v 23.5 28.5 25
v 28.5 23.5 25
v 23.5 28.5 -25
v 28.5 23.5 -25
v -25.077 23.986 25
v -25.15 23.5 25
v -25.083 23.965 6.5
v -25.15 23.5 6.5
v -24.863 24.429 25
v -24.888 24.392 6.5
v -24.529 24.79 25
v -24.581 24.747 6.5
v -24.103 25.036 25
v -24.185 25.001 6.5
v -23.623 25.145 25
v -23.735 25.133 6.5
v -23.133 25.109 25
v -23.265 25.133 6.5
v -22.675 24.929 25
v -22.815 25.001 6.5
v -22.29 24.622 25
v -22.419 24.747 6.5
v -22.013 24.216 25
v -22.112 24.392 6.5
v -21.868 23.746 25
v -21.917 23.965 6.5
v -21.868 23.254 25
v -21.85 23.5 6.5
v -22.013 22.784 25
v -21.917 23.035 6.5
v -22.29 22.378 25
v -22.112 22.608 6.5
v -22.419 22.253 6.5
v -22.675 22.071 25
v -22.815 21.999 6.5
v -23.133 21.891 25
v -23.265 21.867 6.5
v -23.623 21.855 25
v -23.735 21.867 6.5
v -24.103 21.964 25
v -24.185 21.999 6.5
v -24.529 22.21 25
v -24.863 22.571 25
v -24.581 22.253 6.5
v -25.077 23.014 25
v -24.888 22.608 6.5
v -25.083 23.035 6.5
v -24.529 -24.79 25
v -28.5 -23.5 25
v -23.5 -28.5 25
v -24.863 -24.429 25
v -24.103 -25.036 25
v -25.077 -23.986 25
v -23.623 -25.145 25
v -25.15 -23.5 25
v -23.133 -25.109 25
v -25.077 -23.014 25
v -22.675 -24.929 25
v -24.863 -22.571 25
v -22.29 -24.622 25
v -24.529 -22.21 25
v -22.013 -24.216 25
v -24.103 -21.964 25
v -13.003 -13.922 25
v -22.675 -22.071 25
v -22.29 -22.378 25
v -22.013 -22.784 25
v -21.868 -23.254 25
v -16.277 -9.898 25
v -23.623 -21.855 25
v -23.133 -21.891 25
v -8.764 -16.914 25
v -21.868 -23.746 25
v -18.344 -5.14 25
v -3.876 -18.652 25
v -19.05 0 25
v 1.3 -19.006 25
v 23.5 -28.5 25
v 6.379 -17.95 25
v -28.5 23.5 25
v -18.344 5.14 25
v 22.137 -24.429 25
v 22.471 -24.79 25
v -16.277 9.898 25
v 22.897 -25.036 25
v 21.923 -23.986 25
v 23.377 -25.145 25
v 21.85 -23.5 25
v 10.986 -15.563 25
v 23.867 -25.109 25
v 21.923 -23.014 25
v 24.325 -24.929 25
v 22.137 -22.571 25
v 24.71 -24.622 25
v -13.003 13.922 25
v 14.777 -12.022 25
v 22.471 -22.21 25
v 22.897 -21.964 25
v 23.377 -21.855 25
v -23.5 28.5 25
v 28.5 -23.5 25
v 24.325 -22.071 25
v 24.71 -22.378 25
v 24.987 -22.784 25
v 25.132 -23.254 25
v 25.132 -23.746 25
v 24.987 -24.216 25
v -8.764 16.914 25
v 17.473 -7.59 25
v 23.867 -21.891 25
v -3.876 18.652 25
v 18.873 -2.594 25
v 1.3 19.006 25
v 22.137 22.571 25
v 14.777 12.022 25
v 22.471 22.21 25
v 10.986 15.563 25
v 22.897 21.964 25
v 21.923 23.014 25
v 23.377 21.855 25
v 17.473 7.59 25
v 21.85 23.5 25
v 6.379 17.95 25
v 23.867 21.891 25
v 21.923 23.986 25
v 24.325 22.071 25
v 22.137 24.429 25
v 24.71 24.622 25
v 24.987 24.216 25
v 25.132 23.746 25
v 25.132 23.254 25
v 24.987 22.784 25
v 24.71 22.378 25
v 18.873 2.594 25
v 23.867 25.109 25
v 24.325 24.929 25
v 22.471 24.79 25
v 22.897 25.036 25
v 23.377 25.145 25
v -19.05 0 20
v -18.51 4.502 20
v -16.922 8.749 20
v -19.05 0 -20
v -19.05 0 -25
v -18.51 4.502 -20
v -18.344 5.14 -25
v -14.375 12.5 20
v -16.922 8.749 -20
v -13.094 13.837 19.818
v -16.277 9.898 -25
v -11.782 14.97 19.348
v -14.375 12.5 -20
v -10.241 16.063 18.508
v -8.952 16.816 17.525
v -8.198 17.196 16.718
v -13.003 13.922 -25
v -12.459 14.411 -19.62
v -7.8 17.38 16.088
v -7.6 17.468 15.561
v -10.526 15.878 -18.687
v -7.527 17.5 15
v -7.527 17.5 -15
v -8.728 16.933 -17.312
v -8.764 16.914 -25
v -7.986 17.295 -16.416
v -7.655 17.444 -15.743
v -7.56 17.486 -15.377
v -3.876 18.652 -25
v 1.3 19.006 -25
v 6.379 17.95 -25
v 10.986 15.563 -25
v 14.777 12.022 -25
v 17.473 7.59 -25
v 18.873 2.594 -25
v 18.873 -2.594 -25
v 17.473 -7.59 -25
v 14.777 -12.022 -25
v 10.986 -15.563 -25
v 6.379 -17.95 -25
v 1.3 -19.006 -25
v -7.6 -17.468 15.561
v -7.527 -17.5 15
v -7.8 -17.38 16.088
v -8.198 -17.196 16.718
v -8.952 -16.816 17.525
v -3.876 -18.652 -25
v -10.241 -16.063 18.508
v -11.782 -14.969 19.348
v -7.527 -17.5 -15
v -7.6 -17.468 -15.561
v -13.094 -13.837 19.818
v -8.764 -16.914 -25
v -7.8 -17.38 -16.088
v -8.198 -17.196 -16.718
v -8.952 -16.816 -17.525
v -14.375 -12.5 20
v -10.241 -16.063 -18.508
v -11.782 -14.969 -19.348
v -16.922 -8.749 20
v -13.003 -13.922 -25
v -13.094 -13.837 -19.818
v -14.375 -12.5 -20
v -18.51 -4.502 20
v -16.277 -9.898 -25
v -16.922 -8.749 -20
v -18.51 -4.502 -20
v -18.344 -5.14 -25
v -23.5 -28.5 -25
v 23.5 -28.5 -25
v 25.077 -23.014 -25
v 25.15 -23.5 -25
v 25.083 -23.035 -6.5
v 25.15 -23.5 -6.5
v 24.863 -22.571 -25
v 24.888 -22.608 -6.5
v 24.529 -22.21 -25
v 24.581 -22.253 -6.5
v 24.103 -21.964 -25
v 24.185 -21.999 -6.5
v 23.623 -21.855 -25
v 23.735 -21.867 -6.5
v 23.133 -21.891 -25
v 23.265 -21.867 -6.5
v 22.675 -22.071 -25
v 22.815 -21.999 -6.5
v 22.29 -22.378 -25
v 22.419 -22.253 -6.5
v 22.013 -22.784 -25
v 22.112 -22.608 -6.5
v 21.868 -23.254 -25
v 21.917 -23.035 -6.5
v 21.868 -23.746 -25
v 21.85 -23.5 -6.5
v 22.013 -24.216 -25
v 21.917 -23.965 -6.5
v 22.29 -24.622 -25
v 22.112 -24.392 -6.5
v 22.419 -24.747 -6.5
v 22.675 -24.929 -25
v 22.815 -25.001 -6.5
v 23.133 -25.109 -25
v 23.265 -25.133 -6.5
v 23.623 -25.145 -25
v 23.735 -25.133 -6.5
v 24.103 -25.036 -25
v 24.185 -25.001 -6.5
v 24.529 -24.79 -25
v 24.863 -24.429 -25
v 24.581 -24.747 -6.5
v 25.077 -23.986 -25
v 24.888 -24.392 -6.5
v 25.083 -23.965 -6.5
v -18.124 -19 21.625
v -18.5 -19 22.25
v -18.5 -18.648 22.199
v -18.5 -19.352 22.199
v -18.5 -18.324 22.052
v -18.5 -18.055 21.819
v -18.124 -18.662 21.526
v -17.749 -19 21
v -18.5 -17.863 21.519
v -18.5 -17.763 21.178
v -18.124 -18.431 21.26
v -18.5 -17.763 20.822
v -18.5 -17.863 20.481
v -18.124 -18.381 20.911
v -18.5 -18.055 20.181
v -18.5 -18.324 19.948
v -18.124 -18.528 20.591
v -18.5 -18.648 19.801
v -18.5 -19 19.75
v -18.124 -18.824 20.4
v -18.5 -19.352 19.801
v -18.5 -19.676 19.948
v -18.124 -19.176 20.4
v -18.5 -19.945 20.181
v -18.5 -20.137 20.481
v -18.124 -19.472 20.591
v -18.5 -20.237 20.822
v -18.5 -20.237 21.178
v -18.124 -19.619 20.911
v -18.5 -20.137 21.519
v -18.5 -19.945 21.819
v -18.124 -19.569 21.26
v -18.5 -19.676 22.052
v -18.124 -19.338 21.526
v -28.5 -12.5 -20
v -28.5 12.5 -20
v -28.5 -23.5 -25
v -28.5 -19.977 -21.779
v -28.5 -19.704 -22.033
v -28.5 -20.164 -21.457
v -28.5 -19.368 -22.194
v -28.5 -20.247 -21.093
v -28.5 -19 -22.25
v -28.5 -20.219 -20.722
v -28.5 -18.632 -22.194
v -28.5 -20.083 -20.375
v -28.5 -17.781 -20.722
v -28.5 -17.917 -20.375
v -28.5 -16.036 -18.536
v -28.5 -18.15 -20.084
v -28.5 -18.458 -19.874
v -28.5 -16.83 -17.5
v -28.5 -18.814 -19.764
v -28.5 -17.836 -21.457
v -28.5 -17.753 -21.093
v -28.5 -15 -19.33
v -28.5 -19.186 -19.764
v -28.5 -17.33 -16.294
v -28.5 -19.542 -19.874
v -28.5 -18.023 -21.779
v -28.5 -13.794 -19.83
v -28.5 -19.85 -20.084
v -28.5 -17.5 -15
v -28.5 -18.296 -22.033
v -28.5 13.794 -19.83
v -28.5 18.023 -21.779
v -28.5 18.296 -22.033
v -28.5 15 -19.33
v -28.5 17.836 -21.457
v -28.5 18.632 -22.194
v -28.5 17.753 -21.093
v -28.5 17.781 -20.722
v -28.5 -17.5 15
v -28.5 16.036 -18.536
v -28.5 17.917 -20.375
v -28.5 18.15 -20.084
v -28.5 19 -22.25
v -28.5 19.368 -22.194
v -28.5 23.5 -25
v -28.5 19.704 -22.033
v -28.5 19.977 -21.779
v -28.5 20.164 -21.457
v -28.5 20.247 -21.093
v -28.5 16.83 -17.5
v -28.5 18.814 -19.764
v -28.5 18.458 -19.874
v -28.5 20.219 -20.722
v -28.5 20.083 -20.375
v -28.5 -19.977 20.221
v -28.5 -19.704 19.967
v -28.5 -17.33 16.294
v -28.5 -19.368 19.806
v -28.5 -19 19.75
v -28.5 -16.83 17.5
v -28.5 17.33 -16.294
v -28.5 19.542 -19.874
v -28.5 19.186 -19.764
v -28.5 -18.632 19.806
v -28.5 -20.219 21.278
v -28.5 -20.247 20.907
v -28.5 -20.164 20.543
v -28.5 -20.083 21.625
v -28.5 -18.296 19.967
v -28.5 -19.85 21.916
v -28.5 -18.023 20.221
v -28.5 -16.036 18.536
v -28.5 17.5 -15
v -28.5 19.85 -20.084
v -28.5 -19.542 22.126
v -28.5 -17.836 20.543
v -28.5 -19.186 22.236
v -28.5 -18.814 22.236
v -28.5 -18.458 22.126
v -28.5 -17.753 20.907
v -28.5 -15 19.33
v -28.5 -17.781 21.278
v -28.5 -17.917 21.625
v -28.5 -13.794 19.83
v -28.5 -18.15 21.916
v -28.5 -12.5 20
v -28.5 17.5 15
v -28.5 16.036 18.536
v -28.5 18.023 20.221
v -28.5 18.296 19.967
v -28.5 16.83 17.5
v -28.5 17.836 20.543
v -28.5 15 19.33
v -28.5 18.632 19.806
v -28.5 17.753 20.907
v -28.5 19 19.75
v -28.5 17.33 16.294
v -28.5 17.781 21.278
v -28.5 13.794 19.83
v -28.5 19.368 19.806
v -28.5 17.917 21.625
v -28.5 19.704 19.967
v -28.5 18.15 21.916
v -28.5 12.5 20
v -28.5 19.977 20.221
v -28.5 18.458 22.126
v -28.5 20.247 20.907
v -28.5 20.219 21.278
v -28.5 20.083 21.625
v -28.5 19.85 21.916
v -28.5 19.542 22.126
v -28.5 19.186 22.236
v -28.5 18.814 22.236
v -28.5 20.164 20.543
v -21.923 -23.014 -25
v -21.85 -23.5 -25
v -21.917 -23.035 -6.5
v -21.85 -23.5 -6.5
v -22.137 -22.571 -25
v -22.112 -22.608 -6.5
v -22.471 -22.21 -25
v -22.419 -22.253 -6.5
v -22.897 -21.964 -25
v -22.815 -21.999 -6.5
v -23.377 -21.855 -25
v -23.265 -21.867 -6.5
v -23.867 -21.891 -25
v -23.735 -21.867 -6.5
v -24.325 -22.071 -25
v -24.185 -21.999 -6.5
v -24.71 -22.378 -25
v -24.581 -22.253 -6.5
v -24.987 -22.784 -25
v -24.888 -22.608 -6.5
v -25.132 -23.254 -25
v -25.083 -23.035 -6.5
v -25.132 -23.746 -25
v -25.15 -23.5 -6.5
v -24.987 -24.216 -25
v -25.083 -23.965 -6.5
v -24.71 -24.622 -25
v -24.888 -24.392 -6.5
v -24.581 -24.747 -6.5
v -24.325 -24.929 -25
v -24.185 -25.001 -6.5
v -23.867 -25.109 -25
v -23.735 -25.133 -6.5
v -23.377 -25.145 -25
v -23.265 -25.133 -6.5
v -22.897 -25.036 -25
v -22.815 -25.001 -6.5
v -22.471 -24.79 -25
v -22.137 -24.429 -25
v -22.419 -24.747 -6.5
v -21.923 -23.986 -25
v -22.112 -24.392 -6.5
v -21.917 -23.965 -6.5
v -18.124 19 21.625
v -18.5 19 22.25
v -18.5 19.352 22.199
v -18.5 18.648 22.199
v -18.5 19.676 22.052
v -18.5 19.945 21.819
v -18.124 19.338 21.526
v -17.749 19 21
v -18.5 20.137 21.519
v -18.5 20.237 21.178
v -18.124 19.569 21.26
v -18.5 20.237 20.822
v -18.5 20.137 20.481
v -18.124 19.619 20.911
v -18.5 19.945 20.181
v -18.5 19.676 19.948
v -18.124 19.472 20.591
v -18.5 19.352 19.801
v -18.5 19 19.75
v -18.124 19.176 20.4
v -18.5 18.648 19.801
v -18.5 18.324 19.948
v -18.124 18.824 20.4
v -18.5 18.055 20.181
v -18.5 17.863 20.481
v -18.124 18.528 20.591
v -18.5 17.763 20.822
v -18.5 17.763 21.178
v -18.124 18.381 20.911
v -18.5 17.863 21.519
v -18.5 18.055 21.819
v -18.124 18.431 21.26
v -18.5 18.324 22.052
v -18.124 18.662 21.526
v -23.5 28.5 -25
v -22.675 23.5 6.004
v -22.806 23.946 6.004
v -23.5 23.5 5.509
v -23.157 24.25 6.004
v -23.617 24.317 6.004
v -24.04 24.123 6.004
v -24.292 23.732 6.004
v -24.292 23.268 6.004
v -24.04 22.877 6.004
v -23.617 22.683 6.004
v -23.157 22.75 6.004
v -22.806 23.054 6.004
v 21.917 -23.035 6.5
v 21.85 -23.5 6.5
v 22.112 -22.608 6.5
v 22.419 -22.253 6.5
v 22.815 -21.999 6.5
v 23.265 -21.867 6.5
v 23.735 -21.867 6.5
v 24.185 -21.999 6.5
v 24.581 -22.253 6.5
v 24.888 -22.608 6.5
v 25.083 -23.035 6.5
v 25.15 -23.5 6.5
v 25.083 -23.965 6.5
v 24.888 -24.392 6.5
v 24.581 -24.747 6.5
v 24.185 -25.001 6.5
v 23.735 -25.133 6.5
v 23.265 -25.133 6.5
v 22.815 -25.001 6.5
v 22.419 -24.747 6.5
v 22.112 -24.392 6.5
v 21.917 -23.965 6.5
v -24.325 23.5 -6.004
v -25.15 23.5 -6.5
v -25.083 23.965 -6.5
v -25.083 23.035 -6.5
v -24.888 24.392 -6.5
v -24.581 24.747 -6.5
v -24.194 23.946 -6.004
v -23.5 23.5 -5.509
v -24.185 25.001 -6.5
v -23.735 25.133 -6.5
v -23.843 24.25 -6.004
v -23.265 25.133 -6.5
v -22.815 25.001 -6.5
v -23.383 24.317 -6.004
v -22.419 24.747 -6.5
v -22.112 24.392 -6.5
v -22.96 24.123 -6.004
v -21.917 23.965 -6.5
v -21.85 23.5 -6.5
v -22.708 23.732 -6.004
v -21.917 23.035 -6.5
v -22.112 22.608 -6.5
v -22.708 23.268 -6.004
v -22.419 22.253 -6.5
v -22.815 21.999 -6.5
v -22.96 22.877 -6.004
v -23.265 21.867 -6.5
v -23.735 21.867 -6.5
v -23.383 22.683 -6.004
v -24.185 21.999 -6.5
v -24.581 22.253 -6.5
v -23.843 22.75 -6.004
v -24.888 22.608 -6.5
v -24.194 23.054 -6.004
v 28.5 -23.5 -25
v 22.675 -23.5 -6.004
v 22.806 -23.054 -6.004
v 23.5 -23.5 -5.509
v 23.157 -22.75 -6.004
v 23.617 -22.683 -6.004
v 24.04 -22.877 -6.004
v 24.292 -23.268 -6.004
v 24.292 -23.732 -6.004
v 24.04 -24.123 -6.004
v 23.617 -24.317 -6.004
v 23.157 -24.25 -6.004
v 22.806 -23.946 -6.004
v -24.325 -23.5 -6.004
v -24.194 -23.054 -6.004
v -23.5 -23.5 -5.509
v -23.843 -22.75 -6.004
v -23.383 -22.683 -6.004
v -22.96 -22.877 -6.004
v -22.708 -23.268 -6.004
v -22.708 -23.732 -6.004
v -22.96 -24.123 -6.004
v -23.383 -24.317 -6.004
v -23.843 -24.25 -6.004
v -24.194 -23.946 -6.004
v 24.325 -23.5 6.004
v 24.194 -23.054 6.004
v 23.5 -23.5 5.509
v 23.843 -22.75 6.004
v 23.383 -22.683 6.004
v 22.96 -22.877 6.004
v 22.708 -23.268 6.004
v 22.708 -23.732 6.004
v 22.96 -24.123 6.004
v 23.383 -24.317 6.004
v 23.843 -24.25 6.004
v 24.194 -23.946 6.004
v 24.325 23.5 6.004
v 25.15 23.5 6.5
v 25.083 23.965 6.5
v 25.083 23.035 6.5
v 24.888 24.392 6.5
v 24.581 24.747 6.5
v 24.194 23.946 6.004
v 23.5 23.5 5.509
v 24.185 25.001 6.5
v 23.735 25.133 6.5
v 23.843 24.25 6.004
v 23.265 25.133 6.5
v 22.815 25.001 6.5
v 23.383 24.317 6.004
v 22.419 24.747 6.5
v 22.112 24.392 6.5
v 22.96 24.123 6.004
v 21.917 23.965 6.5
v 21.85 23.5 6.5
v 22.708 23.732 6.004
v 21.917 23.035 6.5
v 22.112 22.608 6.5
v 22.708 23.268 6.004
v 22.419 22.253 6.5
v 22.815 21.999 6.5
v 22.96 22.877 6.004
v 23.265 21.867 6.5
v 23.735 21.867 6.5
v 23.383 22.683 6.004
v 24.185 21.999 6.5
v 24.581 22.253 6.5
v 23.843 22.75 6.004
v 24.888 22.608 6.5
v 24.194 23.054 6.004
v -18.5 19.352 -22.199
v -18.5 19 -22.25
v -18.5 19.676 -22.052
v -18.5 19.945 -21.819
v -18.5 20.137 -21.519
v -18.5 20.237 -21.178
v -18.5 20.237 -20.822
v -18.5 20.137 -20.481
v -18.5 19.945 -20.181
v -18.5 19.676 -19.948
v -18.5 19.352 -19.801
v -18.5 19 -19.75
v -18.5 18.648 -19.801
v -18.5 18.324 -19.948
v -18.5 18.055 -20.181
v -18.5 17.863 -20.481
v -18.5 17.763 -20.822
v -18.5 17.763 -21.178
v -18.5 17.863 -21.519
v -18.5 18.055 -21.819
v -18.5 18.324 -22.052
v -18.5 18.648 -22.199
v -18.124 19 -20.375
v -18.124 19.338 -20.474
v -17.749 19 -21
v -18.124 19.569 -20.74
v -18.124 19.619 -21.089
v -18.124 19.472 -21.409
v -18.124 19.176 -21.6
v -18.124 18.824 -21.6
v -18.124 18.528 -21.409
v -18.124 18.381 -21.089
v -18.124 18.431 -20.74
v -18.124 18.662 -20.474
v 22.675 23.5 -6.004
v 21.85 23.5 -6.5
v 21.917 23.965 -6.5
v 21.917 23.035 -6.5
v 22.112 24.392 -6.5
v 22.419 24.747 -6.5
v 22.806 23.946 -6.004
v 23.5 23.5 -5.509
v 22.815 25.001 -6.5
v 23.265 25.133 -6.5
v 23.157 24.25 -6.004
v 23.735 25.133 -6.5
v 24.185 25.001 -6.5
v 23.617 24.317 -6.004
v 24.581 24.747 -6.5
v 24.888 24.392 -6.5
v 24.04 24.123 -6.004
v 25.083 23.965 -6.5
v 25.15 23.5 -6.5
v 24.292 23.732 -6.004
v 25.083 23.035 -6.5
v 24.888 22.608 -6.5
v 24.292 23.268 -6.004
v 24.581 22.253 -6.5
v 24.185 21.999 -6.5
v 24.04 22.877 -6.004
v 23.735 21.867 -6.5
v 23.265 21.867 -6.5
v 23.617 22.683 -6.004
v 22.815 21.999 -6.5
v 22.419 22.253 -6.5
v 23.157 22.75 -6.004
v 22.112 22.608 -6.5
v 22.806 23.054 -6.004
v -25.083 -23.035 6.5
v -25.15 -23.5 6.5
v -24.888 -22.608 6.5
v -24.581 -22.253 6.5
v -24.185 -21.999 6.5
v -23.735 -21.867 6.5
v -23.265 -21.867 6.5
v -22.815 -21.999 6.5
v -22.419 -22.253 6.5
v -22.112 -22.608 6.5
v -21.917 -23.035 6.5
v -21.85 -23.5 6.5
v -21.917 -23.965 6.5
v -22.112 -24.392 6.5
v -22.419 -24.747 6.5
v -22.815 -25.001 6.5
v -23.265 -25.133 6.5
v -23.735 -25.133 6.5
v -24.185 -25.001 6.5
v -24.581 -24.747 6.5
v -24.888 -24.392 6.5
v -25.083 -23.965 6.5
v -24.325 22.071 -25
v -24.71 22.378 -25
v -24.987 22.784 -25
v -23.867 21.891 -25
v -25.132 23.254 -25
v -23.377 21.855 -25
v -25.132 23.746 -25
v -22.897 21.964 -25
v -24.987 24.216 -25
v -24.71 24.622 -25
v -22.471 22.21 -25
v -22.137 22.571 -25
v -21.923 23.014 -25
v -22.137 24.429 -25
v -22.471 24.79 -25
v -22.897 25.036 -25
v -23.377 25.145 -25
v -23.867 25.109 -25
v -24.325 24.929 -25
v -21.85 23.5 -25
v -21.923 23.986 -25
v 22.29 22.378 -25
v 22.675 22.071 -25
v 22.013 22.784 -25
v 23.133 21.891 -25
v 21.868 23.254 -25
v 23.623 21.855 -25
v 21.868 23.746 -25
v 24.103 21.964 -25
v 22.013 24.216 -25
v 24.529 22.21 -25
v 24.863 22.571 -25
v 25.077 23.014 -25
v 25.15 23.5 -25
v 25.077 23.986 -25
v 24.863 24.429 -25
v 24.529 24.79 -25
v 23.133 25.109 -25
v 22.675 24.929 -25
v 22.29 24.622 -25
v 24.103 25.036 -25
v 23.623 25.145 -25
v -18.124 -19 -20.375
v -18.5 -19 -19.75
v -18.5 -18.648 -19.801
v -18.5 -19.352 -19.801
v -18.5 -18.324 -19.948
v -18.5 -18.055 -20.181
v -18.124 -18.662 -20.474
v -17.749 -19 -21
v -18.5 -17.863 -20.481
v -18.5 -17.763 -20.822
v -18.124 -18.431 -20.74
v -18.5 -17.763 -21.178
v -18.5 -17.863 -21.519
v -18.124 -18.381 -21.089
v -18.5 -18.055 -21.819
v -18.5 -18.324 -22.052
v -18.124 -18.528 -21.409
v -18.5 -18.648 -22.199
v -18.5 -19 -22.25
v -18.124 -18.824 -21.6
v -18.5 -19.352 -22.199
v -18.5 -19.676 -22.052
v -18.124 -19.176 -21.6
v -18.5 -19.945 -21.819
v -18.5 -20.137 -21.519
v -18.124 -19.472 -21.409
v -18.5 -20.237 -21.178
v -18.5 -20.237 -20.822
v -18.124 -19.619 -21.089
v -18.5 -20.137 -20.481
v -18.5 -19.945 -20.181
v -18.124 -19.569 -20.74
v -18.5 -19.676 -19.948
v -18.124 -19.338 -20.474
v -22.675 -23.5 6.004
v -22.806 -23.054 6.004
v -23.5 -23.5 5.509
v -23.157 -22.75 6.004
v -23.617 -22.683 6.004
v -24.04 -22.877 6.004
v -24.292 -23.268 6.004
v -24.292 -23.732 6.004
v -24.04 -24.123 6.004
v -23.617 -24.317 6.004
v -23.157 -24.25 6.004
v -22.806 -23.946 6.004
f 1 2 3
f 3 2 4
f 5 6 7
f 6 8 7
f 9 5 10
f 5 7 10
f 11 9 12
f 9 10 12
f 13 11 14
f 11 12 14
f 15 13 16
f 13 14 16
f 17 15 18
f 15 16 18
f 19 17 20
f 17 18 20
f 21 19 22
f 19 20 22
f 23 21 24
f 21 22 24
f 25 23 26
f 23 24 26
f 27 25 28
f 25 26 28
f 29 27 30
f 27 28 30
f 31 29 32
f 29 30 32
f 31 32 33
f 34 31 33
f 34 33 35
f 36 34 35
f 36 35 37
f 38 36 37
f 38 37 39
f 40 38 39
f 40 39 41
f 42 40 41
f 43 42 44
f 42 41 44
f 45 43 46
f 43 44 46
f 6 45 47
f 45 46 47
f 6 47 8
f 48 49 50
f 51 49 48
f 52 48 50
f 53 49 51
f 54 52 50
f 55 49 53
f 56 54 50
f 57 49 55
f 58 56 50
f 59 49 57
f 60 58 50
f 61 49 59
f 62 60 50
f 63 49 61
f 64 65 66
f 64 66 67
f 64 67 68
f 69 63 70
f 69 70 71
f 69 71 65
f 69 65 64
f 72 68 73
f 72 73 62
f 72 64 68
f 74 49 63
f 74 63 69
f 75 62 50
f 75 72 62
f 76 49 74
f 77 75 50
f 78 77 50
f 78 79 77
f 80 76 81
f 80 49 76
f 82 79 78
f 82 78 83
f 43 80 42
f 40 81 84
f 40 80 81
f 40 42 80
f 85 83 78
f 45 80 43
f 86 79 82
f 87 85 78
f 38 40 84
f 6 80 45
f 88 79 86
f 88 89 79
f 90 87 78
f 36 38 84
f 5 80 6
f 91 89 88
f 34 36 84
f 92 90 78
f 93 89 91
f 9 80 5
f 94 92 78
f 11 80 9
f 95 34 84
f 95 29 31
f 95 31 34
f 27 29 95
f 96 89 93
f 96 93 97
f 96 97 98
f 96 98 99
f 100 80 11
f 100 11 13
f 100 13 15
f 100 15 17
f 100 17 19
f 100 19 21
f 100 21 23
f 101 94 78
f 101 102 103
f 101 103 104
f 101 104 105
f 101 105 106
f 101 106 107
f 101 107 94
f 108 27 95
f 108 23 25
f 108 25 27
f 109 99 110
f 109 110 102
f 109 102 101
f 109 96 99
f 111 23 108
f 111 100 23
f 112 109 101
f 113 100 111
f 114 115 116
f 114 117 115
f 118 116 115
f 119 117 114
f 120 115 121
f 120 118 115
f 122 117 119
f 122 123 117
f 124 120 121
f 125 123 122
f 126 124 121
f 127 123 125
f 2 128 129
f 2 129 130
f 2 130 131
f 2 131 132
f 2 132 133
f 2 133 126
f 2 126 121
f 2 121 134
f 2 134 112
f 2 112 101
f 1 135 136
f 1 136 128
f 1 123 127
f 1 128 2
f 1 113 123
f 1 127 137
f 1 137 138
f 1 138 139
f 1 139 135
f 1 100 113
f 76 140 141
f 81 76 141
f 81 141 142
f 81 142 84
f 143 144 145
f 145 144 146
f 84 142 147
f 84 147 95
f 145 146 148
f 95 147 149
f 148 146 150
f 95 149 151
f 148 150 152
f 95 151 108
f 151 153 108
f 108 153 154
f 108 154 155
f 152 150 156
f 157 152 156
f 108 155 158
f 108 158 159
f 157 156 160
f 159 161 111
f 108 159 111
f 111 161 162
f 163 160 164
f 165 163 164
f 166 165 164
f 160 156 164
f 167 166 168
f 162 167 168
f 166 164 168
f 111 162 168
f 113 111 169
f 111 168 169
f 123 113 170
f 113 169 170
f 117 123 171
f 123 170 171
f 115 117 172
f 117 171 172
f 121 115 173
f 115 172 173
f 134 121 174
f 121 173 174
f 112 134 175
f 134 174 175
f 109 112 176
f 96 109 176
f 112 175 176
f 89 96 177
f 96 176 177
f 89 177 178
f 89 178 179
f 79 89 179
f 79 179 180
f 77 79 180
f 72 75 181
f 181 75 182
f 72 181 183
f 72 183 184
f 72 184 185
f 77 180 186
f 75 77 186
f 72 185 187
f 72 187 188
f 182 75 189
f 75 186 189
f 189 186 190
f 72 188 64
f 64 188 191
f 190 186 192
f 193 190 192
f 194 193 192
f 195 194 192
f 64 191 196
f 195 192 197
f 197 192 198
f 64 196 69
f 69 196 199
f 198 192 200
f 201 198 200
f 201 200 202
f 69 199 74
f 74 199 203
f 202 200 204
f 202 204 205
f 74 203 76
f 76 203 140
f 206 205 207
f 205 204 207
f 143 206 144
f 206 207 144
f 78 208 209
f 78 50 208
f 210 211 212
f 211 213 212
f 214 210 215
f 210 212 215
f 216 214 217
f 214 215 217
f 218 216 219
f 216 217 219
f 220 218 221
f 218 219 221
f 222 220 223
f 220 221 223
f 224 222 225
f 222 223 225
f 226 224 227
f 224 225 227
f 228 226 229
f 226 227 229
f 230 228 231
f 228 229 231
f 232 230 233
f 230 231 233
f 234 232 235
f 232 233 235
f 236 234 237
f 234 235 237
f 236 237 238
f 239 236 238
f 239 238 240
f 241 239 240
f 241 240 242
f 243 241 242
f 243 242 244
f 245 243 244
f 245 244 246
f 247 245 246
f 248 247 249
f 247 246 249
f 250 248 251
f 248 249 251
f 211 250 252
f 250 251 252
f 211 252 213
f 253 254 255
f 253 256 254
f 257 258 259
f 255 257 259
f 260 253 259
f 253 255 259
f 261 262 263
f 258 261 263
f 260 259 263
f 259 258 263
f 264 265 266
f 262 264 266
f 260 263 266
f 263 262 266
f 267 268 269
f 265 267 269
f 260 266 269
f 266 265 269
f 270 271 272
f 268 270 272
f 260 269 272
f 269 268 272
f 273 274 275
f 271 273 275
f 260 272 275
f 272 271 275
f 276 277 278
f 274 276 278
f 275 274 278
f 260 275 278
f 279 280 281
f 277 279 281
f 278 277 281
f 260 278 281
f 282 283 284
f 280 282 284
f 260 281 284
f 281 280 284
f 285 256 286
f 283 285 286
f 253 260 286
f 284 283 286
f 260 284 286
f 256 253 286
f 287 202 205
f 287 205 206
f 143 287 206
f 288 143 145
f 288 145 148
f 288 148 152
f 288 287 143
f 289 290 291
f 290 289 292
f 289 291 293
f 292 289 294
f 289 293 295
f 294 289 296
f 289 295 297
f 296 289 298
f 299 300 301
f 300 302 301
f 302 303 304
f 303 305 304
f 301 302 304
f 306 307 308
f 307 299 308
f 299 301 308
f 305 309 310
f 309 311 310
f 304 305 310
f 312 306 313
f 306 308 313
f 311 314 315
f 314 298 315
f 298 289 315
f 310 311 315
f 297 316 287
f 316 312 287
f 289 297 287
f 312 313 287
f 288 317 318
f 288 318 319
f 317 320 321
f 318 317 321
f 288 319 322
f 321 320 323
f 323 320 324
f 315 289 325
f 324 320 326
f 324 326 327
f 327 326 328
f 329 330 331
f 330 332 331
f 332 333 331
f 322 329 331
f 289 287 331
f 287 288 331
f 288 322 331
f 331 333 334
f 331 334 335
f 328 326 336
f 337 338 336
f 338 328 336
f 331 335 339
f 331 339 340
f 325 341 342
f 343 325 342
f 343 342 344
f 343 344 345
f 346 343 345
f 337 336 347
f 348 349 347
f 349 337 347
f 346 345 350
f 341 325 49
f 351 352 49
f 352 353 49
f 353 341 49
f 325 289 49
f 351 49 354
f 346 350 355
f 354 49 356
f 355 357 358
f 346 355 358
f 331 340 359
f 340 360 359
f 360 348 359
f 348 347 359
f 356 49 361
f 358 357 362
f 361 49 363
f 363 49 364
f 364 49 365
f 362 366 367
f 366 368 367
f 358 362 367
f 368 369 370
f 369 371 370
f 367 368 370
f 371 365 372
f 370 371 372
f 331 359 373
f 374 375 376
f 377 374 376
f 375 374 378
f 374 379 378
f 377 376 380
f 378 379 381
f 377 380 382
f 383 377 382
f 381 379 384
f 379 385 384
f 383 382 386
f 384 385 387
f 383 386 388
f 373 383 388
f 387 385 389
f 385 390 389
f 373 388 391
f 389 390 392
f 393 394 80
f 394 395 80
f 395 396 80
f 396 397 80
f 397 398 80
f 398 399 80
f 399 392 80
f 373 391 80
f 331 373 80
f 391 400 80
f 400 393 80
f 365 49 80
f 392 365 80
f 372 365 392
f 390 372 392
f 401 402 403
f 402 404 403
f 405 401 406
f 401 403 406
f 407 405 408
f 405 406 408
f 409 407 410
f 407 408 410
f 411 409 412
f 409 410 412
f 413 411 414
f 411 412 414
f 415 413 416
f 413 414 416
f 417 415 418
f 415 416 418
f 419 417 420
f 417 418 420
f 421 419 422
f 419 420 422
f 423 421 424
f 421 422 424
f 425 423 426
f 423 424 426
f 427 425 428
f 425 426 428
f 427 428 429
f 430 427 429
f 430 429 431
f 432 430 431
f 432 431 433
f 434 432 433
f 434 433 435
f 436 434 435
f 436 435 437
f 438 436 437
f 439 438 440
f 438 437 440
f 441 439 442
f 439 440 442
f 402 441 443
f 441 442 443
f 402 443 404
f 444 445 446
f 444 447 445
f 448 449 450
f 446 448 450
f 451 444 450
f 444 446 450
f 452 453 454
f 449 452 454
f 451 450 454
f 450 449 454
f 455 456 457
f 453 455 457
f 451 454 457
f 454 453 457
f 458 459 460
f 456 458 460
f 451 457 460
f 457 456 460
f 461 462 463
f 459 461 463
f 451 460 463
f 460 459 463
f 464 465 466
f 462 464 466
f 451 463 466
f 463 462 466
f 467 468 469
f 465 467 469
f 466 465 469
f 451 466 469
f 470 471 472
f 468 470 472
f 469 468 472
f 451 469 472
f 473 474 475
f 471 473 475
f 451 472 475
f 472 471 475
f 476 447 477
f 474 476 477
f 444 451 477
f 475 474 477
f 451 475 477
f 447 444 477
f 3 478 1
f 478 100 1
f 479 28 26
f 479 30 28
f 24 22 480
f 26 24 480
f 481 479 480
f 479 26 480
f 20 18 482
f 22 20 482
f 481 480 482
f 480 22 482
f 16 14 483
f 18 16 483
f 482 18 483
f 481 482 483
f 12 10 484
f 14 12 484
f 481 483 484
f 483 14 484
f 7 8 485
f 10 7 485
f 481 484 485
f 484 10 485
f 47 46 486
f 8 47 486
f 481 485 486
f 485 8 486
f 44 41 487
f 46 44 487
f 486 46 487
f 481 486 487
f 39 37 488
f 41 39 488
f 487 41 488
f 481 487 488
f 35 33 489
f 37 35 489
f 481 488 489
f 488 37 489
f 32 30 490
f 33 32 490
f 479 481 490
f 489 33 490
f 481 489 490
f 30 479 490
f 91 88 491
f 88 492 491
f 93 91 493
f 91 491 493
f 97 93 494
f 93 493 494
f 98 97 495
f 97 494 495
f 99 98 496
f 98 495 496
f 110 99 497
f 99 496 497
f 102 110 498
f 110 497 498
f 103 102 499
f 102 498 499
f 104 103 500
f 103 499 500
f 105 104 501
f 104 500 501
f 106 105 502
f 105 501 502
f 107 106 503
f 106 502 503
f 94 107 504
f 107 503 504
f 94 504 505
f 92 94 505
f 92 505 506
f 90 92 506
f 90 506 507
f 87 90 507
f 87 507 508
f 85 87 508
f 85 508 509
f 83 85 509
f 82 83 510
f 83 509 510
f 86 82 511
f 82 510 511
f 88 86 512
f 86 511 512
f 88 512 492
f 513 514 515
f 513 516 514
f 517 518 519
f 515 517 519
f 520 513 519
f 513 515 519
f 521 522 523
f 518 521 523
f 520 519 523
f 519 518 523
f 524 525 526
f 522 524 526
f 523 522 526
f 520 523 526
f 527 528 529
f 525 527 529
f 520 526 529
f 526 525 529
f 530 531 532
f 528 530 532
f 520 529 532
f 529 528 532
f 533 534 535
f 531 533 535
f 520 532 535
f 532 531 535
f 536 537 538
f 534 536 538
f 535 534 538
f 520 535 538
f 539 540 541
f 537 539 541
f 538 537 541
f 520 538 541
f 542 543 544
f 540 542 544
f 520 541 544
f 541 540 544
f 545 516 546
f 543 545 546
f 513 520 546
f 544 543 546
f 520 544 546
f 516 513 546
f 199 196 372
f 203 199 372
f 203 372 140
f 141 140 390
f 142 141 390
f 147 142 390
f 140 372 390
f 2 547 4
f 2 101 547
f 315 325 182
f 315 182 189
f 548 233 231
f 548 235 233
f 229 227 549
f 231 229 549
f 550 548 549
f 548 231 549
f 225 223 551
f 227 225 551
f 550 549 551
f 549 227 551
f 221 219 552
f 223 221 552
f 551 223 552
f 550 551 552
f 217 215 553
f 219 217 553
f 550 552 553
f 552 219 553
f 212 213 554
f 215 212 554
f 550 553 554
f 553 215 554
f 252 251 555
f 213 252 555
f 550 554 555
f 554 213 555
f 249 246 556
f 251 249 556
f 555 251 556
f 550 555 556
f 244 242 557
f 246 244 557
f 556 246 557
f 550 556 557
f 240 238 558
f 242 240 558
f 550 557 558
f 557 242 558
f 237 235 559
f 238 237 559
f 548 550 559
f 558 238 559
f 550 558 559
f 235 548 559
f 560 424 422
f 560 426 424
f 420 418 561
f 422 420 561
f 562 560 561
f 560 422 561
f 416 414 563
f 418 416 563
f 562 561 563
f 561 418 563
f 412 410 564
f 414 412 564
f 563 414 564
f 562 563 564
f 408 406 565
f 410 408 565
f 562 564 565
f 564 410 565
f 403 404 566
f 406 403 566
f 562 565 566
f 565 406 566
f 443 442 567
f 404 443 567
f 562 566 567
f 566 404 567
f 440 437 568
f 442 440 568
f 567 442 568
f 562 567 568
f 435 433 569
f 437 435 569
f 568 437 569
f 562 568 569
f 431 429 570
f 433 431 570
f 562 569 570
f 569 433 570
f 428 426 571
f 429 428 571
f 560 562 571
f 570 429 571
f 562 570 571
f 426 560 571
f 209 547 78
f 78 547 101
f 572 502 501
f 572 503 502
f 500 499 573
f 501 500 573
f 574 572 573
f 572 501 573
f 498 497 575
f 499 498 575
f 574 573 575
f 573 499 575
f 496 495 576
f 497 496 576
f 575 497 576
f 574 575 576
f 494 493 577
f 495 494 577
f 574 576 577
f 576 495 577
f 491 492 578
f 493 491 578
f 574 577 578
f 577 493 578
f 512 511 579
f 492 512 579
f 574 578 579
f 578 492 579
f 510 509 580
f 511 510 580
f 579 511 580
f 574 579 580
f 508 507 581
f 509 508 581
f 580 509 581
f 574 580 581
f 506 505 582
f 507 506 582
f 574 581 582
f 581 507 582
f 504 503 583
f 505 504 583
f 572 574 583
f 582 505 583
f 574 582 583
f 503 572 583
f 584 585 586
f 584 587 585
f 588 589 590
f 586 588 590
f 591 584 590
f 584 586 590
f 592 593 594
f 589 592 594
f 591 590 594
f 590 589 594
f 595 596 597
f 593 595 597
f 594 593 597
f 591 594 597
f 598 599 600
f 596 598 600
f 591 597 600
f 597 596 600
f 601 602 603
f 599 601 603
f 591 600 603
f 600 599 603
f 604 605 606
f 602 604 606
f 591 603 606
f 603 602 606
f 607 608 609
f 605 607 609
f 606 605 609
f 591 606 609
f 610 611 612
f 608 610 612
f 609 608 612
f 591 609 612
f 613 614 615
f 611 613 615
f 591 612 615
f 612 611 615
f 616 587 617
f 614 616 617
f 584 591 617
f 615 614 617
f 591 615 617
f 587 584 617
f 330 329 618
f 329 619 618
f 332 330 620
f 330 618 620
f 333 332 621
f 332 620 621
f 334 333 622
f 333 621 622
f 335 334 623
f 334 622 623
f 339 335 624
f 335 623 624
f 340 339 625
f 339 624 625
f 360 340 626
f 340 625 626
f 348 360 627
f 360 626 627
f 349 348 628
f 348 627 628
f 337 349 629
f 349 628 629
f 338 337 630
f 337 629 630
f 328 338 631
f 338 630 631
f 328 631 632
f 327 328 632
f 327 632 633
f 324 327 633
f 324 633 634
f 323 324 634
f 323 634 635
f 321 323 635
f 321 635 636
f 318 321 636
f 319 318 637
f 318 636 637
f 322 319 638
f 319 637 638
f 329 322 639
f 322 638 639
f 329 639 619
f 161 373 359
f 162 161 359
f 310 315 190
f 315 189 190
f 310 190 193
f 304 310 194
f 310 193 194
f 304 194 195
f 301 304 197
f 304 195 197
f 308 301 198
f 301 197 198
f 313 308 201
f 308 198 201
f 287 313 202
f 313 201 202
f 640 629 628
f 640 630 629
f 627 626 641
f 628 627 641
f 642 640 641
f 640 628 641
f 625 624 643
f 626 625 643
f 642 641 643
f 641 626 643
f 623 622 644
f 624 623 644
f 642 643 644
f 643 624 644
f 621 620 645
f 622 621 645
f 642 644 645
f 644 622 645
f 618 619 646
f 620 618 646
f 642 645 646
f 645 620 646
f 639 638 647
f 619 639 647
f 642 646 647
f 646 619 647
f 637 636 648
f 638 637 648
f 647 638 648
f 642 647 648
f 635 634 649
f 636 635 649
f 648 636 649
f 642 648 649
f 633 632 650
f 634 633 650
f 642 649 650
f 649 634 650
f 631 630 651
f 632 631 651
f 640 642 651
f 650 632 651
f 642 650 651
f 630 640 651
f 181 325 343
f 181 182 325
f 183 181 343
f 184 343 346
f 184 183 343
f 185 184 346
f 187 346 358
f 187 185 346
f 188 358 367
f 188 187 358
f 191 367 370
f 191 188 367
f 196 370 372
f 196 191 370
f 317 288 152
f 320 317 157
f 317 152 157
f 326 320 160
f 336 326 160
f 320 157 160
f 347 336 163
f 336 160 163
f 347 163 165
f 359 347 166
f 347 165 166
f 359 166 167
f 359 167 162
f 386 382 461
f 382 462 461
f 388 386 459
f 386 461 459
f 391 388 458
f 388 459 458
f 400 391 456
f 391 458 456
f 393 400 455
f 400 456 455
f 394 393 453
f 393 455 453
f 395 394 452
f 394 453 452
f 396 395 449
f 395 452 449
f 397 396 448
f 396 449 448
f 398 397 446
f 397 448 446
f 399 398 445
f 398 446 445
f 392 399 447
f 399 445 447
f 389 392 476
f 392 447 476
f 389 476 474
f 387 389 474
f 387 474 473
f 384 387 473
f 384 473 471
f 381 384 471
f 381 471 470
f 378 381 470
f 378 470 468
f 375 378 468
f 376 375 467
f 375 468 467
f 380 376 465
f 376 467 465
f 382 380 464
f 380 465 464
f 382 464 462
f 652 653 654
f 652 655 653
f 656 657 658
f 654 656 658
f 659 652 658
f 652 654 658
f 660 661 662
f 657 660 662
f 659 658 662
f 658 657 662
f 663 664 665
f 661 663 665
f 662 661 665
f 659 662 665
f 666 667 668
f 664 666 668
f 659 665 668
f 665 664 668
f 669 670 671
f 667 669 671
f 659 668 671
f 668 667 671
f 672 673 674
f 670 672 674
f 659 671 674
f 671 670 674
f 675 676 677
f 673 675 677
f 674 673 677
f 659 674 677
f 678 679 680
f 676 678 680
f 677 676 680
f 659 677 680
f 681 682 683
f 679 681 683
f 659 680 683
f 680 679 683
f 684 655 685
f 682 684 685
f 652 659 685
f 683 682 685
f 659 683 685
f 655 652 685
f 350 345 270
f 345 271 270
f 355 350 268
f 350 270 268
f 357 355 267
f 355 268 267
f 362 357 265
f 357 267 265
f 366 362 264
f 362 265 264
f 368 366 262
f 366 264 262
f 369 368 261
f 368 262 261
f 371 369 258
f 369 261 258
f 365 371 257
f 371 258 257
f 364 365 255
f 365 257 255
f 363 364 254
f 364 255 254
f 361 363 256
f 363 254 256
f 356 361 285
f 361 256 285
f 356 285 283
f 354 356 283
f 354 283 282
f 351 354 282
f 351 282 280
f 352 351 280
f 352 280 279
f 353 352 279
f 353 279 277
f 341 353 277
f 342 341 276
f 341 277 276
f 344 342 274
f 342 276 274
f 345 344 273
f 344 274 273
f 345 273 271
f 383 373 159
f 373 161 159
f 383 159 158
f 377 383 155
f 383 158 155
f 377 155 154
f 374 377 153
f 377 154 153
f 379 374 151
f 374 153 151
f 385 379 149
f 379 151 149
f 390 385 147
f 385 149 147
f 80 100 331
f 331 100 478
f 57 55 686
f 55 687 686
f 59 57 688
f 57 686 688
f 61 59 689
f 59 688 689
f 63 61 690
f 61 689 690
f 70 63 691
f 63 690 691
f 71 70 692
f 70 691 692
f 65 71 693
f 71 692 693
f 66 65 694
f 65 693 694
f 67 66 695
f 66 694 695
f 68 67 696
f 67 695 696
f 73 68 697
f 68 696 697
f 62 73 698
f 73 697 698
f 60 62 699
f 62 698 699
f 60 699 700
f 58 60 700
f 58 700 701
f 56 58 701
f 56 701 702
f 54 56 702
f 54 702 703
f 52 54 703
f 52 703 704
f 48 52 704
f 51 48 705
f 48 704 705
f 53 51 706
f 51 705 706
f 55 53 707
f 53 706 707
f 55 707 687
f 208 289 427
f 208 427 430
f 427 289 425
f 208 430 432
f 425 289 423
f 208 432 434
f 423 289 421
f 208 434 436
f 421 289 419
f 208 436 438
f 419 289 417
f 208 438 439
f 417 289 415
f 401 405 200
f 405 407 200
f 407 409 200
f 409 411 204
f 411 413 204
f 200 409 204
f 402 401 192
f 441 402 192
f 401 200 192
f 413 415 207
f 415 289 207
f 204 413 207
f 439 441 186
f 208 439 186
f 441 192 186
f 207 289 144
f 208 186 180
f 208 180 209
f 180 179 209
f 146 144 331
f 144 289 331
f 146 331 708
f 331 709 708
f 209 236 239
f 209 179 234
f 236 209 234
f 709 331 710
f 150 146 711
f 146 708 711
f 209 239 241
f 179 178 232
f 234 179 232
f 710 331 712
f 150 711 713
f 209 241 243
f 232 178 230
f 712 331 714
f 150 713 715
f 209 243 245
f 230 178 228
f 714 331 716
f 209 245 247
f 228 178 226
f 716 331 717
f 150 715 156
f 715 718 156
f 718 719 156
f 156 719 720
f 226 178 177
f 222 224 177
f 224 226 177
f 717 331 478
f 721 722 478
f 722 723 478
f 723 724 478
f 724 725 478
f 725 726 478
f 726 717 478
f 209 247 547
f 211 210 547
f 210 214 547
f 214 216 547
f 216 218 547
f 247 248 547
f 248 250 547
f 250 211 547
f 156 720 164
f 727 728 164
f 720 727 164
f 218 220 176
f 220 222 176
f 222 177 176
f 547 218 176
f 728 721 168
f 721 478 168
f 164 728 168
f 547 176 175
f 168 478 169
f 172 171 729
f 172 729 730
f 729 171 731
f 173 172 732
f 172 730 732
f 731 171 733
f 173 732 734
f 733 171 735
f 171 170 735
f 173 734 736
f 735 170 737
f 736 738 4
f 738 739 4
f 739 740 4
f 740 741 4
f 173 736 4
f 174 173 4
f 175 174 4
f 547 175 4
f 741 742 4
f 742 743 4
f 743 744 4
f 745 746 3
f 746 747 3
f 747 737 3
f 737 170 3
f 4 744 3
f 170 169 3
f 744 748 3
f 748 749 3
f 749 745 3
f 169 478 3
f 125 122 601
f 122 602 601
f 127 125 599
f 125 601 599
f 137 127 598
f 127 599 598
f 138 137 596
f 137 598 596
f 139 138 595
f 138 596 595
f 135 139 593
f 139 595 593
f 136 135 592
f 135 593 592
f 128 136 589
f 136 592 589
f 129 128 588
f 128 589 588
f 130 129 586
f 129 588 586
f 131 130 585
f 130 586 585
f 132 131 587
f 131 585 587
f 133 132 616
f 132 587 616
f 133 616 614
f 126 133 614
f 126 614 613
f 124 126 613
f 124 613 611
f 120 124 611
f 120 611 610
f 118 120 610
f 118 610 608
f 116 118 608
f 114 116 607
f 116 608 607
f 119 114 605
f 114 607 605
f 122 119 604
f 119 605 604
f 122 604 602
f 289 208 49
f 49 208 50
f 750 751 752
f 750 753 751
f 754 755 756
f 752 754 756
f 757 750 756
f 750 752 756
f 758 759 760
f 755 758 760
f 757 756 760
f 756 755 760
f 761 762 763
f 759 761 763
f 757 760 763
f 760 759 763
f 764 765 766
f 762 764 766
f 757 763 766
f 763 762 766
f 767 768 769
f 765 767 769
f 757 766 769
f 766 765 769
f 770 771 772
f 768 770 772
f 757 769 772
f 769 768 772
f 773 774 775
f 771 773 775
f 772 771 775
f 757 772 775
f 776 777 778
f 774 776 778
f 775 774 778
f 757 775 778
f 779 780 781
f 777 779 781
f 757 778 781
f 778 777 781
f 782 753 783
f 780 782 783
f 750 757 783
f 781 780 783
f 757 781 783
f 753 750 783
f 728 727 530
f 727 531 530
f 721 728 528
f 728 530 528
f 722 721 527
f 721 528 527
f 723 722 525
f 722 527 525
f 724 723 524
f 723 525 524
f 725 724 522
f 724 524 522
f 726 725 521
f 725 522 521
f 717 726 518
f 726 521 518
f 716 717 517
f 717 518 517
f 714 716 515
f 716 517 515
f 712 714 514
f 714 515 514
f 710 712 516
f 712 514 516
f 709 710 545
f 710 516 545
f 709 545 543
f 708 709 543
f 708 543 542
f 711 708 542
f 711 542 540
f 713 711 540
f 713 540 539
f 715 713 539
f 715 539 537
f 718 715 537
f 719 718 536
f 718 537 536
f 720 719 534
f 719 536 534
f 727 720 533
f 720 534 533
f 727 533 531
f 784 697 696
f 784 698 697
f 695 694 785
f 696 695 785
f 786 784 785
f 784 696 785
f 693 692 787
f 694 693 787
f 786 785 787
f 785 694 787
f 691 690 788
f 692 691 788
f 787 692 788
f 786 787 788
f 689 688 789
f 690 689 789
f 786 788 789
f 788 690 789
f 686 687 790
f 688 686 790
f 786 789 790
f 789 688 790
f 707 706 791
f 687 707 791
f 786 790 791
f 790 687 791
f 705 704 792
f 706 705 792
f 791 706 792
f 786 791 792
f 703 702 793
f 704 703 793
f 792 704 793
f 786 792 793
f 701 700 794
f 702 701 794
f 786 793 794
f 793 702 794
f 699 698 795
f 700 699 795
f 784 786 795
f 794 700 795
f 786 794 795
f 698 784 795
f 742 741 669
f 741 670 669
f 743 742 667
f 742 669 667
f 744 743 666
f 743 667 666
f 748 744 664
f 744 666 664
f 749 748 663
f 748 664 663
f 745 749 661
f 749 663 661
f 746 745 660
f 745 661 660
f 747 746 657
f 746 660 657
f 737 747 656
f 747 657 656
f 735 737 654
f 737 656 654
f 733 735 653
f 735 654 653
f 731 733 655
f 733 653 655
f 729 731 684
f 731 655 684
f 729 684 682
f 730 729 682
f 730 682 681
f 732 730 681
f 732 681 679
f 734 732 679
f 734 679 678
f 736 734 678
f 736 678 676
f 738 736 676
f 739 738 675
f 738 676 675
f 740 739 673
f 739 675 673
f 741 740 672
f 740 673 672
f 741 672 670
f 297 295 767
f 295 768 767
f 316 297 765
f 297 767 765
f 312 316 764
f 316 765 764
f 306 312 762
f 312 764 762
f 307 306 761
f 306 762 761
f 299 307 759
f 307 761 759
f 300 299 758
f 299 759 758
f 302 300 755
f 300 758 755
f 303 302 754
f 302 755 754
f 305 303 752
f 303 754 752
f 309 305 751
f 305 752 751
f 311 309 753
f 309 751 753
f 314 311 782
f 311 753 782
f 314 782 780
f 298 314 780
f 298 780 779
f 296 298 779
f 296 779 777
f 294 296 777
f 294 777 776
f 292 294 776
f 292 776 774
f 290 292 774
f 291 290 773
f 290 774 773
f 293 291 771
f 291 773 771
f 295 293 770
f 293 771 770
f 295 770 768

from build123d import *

# Parameters (mm, degrees)
SKETCH_1_W             = 57
SKETCH_1_H             = 57
EXTRUDE_1_DEPTH        = 25
SKETCH_2_R             = 19.05
CUT_EXTRUDE_1_DEPTH    = 51
SKETCH_3_W             = 40
SKETCH_3_H             = 35
CUT_EXTRUDE_2_DEPTH    = 32
CHAMFER_1_SIZE         = 5
HOLE_WIZARD_M4_1_D     = 3.3
HOLE_WIZARD_M4_1_DEPTH = 18.5
HOLE_WIZARD_M4_1_TIP   = 0.991420021
FILLET_1_R             = 5
HOLE_WIZARD_M3_1_D     = 2.5
HOLE_WIZARD_M3_1_DEPTH = 10
HOLE_WIZARD_M3_1_TIP   = 0.751075774
HOLE_WIZARD_M4_2_D     = 3.3
HOLE_WIZARD_M4_2_DEPTH = 18.5
HOLE_WIZARD_M4_2_TIP   = 0.991420021


with BuildPart() as part:
    # 草图1 → 凸台-拉伸1 (new body, symmetric)
    with BuildSketch(Plane.XY):
        Rectangle(SKETCH_1_W, SKETCH_1_H)
    extrude(amount=EXTRUDE_1_DEPTH, both=True)

    # 草图2 → 切除-拉伸1 (cut, through all)
    with BuildSketch(Plane(origin=(0, 0, -25), x_dir=(-1, 0, 0), z_dir=(0, 0, -1))):
        Circle(SKETCH_2_R)
    extrude(amount=-CUT_EXTRUDE_1_DEPTH, mode=Mode.SUBTRACT)

    # 草图3 → 切除-拉伸2 (cut)
    with BuildSketch(Plane(origin=(-28.5, 0, 0), x_dir=(0, 0, -1), z_dir=(1, 0, 0))):
        Rectangle(SKETCH_3_W, SKETCH_3_H)
    extrude(amount=CUT_EXTRUDE_2_DEPTH, mode=Mode.SUBTRACT)

    # 倒角1
    chamfer_1_edges = [part.edges().sort_by_distance(p)[0] for p in [
        (28.5, -28.5, 0),
        (-28.5, -28.5, 0),
        (-28.5, 28.5, 0),
        (28.5, 28.5, 0),
    ]]
    chamfer(chamfer_1_edges, length=CHAMFER_1_SIZE)

    # M4 螺纹孔1
    with Locations(Plane(origin=(0, 0, -25), x_dir=(-1, 0, 0), z_dir=(0, 0, -1))):
        with Locations((-23.5, 23.5), (23.5, 23.5), (23.5, -23.5), (-23.5, -23.5)):
            Hole(HOLE_WIZARD_M4_1_D / 2, depth=HOLE_WIZARD_M4_1_DEPTH)
            with Locations((0, 0, -(HOLE_WIZARD_M4_1_DEPTH + HOLE_WIZARD_M4_1_TIP / 2))):  # 118° drill point
                Cone(0, HOLE_WIZARD_M4_1_D / 2, HOLE_WIZARD_M4_1_TIP, mode=Mode.SUBTRACT)

    # 圆角1
    fillet_1_edges = [part.edges().sort_by_distance(p)[0] for p in [
        (-18.013392751, -17.5, -20),
        (-18.013392751, 17.5, -20),
        (-18.013392751, 17.5, 20),
        (-18.013392751, -17.5, 20),
    ]]
    fillet(fillet_1_edges, radius=FILLET_1_R)

    # M3 螺纹孔1
    with Locations(Plane.ZY.offset(28.5)):
        with Locations((21, 19), (-21, 19), (-21, -19), (21, -19)):
            Hole(HOLE_WIZARD_M3_1_D / 2, depth=HOLE_WIZARD_M3_1_DEPTH)
            with Locations((0, 0, -(HOLE_WIZARD_M3_1_DEPTH + HOLE_WIZARD_M3_1_TIP / 2))):  # 118° drill point
                Cone(0, HOLE_WIZARD_M3_1_D / 2, HOLE_WIZARD_M3_1_TIP, mode=Mode.SUBTRACT)

    # M4 螺纹孔2
    with Locations(Plane.XY.offset(25)):
        with Locations((23.5, 23.5), (-23.5, 23.5), (-23.5, -23.5), (23.5, -23.5)):
            Hole(HOLE_WIZARD_M4_2_D / 2, depth=HOLE_WIZARD_M4_2_DEPTH)
            with Locations((0, 0, -(HOLE_WIZARD_M4_2_DEPTH + HOLE_WIZARD_M4_2_TIP / 2))):  # 118° drill point
                Cone(0, HOLE_WIZARD_M4_2_D / 2, HOLE_WIZARD_M4_2_TIP, mode=Mode.SUBTRACT)


solid = part.part
